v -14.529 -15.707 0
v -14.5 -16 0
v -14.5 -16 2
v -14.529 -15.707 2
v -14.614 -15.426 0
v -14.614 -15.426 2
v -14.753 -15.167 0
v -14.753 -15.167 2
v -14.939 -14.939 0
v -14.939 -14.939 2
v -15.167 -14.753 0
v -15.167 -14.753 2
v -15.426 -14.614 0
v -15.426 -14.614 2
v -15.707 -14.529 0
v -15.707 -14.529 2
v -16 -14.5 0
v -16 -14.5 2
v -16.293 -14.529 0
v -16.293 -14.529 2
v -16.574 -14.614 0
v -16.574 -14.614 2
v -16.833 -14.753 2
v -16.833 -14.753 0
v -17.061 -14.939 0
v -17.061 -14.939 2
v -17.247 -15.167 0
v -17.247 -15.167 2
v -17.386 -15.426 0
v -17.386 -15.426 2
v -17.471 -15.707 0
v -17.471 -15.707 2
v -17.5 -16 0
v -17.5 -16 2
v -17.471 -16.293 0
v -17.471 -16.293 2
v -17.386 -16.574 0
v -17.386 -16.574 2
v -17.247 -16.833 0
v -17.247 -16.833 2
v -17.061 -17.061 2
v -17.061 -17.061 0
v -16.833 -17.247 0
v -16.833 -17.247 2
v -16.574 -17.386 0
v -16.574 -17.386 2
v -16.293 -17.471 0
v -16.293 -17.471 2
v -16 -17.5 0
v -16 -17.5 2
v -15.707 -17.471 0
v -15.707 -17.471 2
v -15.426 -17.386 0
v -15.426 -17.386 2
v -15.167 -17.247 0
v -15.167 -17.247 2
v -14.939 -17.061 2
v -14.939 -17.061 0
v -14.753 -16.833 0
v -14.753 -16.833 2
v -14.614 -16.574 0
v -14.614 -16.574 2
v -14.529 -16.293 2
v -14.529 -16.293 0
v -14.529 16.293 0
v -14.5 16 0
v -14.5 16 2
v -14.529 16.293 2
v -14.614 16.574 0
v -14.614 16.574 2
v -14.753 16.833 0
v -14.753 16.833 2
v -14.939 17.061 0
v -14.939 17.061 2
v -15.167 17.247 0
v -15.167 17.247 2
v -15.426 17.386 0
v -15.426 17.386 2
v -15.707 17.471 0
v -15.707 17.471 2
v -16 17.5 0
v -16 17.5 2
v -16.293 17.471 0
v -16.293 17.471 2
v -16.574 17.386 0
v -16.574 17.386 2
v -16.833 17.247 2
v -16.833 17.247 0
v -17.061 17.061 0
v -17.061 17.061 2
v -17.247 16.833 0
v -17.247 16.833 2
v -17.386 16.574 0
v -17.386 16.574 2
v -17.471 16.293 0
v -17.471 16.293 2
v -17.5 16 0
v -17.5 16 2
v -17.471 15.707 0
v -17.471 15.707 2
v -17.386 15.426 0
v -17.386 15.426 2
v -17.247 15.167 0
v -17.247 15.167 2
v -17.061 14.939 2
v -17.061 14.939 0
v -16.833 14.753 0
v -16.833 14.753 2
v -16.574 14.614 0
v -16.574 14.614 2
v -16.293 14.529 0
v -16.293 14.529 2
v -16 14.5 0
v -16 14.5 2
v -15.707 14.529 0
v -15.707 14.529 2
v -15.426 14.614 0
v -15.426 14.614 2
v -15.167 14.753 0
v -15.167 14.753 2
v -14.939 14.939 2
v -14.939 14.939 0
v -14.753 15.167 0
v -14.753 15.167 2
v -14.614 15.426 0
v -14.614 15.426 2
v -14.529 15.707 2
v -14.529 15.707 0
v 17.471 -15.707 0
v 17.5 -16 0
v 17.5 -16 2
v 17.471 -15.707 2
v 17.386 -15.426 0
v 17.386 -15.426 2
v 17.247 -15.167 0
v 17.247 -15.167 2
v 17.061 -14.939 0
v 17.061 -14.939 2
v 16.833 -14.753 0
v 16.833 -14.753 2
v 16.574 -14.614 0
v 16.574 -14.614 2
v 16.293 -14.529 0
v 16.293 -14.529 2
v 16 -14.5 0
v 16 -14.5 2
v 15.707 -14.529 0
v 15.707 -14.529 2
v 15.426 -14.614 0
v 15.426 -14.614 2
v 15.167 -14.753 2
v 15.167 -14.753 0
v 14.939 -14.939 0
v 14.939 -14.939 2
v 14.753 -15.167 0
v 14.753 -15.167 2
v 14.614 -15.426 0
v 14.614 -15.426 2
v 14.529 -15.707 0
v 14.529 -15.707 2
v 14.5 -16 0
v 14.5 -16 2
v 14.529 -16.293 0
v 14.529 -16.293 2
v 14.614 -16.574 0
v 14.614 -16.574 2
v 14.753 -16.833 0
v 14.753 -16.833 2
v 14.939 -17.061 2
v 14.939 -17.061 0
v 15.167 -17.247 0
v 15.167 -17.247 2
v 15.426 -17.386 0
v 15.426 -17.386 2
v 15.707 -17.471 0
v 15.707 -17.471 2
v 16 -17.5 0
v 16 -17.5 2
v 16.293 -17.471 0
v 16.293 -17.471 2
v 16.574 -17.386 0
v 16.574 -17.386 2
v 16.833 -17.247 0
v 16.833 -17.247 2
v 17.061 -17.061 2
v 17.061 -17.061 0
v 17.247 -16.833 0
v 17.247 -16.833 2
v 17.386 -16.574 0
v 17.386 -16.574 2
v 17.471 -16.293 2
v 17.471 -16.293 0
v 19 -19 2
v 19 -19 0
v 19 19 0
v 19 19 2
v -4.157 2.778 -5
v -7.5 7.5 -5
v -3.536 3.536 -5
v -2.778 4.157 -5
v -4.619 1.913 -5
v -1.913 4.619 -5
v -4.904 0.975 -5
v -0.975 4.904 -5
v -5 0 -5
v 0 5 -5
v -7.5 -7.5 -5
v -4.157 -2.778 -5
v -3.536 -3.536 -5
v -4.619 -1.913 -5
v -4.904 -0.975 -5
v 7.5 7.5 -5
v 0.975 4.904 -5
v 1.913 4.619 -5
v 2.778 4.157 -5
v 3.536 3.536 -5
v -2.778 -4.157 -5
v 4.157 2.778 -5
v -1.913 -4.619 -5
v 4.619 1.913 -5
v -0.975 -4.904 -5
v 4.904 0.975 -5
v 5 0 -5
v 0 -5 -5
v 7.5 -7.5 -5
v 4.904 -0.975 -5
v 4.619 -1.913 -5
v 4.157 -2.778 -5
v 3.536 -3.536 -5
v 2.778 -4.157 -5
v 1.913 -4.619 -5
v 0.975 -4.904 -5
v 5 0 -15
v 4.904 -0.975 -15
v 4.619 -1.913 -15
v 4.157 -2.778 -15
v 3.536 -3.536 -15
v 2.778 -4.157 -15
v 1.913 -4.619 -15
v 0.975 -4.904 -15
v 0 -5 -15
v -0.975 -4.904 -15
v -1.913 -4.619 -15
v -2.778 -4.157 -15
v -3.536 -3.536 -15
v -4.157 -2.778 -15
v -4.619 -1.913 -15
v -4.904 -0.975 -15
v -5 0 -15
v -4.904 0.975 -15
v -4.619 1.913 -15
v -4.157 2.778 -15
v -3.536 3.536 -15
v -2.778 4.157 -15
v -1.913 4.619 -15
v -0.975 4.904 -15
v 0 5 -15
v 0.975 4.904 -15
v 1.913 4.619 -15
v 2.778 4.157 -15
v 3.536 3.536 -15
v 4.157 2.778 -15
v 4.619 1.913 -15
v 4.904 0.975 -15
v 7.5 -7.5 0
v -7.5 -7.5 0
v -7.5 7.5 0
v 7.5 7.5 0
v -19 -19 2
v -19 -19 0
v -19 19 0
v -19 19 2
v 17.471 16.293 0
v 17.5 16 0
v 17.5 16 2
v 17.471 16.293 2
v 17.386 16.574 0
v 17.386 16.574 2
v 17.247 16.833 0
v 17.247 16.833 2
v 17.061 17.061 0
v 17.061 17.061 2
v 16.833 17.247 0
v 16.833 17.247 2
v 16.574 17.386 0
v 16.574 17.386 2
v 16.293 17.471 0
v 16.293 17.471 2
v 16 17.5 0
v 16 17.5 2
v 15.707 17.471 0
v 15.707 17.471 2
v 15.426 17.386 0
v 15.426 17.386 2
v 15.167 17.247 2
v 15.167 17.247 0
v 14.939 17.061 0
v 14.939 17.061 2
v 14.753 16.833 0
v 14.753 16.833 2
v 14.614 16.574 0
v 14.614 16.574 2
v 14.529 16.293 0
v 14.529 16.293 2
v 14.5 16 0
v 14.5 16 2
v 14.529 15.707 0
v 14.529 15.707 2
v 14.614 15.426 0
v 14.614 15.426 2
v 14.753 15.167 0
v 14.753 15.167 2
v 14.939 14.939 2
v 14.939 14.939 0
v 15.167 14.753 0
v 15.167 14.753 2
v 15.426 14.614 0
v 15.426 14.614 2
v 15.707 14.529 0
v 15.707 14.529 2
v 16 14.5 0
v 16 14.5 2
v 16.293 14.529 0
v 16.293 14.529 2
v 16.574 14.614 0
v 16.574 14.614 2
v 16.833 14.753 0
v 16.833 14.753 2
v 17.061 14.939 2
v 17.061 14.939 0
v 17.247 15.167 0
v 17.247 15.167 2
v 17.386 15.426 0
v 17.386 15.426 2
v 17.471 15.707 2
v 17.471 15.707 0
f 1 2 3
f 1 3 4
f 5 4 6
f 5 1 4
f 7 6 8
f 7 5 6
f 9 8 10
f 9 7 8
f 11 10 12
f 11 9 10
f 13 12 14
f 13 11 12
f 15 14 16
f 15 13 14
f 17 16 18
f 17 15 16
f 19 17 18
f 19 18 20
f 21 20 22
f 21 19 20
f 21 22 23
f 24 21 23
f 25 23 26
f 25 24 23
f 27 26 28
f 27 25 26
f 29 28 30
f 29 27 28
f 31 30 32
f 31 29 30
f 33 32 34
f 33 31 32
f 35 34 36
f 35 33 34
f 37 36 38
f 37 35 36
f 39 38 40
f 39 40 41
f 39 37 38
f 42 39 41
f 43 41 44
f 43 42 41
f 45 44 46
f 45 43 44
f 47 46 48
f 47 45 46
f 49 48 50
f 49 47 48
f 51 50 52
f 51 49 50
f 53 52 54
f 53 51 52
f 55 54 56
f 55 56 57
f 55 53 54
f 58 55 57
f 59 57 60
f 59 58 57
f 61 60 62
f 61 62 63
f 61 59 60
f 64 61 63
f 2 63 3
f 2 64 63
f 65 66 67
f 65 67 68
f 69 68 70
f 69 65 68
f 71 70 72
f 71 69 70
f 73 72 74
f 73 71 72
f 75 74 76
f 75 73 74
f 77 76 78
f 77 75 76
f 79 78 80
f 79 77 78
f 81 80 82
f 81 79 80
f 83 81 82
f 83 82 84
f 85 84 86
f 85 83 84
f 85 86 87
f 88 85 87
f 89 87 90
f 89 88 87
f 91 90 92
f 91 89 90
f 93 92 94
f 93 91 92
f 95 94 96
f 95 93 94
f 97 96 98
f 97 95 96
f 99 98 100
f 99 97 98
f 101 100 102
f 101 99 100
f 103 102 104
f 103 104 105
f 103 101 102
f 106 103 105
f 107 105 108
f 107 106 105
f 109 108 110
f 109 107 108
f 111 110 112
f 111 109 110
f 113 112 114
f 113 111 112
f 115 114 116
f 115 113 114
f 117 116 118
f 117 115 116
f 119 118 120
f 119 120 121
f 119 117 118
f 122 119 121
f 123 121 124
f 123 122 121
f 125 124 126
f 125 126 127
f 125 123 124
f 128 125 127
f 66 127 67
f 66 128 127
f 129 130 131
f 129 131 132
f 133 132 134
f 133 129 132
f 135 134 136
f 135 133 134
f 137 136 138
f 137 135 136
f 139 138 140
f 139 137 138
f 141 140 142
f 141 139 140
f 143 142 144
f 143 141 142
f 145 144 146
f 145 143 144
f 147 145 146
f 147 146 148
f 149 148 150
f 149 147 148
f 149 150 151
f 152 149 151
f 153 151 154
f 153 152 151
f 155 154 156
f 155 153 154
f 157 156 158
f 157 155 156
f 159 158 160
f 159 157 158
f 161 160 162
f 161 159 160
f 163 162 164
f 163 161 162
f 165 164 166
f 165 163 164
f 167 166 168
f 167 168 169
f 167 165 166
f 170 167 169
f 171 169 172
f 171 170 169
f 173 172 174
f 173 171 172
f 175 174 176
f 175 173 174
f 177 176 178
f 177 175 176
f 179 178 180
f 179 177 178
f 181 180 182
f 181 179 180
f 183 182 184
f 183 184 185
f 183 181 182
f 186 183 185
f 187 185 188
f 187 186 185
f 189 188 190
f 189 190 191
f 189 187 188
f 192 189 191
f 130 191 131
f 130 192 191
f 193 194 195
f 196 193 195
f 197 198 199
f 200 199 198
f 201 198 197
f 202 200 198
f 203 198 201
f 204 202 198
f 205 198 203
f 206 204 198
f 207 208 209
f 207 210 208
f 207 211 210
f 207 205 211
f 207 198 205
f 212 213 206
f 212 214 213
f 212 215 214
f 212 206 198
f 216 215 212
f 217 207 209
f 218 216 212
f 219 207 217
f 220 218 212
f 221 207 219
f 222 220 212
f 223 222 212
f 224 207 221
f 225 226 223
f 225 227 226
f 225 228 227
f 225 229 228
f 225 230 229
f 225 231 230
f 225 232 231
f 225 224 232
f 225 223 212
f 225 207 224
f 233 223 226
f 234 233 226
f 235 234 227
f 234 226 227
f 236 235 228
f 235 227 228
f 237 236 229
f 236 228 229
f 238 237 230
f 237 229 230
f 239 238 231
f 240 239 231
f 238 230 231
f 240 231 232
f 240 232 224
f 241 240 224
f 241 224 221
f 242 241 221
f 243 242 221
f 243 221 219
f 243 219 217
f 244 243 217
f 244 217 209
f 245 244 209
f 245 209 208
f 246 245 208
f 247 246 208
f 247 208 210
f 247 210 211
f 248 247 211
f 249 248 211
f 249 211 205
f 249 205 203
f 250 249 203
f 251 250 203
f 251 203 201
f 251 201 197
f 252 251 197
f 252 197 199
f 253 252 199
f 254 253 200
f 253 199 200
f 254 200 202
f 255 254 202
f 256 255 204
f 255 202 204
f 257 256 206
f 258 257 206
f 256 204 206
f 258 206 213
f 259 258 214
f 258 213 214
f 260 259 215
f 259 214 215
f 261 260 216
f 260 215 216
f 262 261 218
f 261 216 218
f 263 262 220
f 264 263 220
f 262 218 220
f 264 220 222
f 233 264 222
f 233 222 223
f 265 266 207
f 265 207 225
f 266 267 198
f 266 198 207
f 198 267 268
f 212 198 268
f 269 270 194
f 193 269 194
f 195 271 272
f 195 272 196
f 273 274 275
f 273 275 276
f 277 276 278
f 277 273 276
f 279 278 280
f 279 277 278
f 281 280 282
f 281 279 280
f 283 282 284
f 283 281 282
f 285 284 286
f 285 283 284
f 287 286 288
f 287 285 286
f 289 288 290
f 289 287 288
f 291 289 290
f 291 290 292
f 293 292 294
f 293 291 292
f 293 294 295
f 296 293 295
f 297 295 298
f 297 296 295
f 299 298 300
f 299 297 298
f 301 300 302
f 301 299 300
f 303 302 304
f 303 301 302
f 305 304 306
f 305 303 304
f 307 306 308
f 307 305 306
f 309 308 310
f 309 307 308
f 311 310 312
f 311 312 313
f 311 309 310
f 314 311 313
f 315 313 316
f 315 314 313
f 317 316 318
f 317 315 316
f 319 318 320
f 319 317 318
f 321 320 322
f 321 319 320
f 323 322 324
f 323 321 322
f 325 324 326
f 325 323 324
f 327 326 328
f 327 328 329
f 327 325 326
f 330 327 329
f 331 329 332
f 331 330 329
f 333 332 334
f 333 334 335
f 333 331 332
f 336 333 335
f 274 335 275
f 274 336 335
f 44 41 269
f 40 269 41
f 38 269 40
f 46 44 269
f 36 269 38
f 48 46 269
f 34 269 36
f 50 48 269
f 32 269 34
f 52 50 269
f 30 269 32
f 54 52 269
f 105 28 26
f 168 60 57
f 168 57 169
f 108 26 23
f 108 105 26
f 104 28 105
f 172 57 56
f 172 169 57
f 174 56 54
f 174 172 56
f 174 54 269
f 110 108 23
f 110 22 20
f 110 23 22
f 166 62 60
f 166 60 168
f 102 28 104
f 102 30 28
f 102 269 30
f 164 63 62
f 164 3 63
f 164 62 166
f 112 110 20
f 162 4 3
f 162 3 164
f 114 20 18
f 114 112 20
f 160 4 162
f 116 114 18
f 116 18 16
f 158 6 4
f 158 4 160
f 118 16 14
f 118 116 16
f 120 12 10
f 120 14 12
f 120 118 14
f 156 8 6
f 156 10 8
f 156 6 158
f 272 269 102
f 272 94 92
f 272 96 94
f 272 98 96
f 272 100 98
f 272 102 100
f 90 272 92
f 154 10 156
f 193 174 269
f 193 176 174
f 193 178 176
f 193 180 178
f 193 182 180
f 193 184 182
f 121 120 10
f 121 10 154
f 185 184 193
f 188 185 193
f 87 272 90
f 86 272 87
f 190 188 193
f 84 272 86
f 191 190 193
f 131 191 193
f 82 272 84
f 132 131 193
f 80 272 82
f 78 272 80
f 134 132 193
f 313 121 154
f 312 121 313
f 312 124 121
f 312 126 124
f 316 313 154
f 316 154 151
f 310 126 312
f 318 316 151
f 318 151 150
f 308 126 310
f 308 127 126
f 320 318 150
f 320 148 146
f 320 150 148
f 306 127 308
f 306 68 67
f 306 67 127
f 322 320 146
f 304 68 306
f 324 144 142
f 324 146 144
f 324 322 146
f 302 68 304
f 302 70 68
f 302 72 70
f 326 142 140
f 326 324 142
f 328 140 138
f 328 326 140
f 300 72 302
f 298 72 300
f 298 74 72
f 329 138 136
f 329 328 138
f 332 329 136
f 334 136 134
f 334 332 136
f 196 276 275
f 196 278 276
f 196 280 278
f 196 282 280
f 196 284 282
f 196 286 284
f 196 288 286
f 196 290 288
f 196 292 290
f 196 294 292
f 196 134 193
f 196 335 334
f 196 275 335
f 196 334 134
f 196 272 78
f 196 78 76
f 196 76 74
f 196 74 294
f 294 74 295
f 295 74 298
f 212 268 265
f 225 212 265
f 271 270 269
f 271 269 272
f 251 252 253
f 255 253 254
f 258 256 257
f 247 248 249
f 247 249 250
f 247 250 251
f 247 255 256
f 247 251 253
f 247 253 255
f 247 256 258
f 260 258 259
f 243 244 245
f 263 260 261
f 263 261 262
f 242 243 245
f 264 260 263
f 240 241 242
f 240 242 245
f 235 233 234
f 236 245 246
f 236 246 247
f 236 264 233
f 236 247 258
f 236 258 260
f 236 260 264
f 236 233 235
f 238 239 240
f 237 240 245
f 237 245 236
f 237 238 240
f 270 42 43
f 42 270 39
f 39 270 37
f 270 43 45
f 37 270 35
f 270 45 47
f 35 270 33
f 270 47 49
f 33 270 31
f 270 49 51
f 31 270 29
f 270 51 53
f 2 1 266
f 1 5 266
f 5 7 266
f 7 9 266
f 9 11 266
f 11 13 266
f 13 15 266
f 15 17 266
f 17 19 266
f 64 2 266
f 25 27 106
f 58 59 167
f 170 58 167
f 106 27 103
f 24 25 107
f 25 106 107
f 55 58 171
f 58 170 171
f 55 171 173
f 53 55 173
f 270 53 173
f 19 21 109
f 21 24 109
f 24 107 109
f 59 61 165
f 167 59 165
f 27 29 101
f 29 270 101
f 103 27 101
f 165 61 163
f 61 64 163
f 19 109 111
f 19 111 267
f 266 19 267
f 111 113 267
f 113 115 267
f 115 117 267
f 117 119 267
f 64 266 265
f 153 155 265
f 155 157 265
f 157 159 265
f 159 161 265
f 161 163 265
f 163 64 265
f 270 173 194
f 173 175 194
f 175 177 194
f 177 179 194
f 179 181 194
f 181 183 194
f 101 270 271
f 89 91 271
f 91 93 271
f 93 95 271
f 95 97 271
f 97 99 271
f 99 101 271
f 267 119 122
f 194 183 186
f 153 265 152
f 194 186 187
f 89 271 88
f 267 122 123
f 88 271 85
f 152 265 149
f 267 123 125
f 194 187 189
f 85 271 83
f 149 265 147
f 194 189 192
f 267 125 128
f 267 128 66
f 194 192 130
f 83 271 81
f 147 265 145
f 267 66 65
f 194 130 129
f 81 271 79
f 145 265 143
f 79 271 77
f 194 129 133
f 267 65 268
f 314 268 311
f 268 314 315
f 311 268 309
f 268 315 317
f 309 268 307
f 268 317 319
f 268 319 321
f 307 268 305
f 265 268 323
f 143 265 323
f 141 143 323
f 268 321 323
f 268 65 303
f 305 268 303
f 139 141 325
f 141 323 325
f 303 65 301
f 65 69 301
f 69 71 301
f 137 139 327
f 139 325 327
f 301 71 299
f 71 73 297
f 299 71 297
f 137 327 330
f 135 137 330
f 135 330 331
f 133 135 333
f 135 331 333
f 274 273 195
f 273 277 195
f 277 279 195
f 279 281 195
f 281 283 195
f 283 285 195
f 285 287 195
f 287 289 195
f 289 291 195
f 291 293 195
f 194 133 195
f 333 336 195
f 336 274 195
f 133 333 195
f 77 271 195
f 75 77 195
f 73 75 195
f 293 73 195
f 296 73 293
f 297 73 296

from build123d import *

# Parameters (mm, degrees)
F0_W      = 38
F0_H      = 38
F0_R      = 1.5
F1_DEPTH  = 2
F2_W      = 15
F2_H      = 15
F2_R      = 5
F3_DEPTH  = 5
F3_FACE_R = 5
F4_DEPTH  = 15


with BuildPart() as f1:
    # F0 (on Top) → F1 (new body)
    with BuildSketch(Plane.XY):
        Rectangle(F0_W, F0_H)
        with Locations((-16, -16)):
            Circle(F0_R, mode=Mode.SUBTRACT)
        with Locations((16, -16)):
            Circle(F0_R, mode=Mode.SUBTRACT)
        with Locations((-16, 16)):
            Circle(F0_R, mode=Mode.SUBTRACT)
        with Locations((16, 16)):
            Circle(F0_R, mode=Mode.SUBTRACT)
    extrude(amount=F1_DEPTH)

    # F2 (on face) → F3 (join)
    with BuildSketch(Plane(origin=(0, 0, 0), x_dir=(1, 0, 0), z_dir=(0, 0, -1))):
        Rectangle(F2_W, F2_H)
        Circle(F2_R, mode=Mode.SUBTRACT)
    extrude(amount=F3_DEPTH)

    # F3_face (on face) → F4 (join)
    with BuildSketch(Plane(origin=(0, 0, 0), x_dir=(1, 0, 0), z_dir=(0, 0, -1))):
        Circle(F3_FACE_R)
    extrude(amount=F4_DEPTH)


solid = f1.part
